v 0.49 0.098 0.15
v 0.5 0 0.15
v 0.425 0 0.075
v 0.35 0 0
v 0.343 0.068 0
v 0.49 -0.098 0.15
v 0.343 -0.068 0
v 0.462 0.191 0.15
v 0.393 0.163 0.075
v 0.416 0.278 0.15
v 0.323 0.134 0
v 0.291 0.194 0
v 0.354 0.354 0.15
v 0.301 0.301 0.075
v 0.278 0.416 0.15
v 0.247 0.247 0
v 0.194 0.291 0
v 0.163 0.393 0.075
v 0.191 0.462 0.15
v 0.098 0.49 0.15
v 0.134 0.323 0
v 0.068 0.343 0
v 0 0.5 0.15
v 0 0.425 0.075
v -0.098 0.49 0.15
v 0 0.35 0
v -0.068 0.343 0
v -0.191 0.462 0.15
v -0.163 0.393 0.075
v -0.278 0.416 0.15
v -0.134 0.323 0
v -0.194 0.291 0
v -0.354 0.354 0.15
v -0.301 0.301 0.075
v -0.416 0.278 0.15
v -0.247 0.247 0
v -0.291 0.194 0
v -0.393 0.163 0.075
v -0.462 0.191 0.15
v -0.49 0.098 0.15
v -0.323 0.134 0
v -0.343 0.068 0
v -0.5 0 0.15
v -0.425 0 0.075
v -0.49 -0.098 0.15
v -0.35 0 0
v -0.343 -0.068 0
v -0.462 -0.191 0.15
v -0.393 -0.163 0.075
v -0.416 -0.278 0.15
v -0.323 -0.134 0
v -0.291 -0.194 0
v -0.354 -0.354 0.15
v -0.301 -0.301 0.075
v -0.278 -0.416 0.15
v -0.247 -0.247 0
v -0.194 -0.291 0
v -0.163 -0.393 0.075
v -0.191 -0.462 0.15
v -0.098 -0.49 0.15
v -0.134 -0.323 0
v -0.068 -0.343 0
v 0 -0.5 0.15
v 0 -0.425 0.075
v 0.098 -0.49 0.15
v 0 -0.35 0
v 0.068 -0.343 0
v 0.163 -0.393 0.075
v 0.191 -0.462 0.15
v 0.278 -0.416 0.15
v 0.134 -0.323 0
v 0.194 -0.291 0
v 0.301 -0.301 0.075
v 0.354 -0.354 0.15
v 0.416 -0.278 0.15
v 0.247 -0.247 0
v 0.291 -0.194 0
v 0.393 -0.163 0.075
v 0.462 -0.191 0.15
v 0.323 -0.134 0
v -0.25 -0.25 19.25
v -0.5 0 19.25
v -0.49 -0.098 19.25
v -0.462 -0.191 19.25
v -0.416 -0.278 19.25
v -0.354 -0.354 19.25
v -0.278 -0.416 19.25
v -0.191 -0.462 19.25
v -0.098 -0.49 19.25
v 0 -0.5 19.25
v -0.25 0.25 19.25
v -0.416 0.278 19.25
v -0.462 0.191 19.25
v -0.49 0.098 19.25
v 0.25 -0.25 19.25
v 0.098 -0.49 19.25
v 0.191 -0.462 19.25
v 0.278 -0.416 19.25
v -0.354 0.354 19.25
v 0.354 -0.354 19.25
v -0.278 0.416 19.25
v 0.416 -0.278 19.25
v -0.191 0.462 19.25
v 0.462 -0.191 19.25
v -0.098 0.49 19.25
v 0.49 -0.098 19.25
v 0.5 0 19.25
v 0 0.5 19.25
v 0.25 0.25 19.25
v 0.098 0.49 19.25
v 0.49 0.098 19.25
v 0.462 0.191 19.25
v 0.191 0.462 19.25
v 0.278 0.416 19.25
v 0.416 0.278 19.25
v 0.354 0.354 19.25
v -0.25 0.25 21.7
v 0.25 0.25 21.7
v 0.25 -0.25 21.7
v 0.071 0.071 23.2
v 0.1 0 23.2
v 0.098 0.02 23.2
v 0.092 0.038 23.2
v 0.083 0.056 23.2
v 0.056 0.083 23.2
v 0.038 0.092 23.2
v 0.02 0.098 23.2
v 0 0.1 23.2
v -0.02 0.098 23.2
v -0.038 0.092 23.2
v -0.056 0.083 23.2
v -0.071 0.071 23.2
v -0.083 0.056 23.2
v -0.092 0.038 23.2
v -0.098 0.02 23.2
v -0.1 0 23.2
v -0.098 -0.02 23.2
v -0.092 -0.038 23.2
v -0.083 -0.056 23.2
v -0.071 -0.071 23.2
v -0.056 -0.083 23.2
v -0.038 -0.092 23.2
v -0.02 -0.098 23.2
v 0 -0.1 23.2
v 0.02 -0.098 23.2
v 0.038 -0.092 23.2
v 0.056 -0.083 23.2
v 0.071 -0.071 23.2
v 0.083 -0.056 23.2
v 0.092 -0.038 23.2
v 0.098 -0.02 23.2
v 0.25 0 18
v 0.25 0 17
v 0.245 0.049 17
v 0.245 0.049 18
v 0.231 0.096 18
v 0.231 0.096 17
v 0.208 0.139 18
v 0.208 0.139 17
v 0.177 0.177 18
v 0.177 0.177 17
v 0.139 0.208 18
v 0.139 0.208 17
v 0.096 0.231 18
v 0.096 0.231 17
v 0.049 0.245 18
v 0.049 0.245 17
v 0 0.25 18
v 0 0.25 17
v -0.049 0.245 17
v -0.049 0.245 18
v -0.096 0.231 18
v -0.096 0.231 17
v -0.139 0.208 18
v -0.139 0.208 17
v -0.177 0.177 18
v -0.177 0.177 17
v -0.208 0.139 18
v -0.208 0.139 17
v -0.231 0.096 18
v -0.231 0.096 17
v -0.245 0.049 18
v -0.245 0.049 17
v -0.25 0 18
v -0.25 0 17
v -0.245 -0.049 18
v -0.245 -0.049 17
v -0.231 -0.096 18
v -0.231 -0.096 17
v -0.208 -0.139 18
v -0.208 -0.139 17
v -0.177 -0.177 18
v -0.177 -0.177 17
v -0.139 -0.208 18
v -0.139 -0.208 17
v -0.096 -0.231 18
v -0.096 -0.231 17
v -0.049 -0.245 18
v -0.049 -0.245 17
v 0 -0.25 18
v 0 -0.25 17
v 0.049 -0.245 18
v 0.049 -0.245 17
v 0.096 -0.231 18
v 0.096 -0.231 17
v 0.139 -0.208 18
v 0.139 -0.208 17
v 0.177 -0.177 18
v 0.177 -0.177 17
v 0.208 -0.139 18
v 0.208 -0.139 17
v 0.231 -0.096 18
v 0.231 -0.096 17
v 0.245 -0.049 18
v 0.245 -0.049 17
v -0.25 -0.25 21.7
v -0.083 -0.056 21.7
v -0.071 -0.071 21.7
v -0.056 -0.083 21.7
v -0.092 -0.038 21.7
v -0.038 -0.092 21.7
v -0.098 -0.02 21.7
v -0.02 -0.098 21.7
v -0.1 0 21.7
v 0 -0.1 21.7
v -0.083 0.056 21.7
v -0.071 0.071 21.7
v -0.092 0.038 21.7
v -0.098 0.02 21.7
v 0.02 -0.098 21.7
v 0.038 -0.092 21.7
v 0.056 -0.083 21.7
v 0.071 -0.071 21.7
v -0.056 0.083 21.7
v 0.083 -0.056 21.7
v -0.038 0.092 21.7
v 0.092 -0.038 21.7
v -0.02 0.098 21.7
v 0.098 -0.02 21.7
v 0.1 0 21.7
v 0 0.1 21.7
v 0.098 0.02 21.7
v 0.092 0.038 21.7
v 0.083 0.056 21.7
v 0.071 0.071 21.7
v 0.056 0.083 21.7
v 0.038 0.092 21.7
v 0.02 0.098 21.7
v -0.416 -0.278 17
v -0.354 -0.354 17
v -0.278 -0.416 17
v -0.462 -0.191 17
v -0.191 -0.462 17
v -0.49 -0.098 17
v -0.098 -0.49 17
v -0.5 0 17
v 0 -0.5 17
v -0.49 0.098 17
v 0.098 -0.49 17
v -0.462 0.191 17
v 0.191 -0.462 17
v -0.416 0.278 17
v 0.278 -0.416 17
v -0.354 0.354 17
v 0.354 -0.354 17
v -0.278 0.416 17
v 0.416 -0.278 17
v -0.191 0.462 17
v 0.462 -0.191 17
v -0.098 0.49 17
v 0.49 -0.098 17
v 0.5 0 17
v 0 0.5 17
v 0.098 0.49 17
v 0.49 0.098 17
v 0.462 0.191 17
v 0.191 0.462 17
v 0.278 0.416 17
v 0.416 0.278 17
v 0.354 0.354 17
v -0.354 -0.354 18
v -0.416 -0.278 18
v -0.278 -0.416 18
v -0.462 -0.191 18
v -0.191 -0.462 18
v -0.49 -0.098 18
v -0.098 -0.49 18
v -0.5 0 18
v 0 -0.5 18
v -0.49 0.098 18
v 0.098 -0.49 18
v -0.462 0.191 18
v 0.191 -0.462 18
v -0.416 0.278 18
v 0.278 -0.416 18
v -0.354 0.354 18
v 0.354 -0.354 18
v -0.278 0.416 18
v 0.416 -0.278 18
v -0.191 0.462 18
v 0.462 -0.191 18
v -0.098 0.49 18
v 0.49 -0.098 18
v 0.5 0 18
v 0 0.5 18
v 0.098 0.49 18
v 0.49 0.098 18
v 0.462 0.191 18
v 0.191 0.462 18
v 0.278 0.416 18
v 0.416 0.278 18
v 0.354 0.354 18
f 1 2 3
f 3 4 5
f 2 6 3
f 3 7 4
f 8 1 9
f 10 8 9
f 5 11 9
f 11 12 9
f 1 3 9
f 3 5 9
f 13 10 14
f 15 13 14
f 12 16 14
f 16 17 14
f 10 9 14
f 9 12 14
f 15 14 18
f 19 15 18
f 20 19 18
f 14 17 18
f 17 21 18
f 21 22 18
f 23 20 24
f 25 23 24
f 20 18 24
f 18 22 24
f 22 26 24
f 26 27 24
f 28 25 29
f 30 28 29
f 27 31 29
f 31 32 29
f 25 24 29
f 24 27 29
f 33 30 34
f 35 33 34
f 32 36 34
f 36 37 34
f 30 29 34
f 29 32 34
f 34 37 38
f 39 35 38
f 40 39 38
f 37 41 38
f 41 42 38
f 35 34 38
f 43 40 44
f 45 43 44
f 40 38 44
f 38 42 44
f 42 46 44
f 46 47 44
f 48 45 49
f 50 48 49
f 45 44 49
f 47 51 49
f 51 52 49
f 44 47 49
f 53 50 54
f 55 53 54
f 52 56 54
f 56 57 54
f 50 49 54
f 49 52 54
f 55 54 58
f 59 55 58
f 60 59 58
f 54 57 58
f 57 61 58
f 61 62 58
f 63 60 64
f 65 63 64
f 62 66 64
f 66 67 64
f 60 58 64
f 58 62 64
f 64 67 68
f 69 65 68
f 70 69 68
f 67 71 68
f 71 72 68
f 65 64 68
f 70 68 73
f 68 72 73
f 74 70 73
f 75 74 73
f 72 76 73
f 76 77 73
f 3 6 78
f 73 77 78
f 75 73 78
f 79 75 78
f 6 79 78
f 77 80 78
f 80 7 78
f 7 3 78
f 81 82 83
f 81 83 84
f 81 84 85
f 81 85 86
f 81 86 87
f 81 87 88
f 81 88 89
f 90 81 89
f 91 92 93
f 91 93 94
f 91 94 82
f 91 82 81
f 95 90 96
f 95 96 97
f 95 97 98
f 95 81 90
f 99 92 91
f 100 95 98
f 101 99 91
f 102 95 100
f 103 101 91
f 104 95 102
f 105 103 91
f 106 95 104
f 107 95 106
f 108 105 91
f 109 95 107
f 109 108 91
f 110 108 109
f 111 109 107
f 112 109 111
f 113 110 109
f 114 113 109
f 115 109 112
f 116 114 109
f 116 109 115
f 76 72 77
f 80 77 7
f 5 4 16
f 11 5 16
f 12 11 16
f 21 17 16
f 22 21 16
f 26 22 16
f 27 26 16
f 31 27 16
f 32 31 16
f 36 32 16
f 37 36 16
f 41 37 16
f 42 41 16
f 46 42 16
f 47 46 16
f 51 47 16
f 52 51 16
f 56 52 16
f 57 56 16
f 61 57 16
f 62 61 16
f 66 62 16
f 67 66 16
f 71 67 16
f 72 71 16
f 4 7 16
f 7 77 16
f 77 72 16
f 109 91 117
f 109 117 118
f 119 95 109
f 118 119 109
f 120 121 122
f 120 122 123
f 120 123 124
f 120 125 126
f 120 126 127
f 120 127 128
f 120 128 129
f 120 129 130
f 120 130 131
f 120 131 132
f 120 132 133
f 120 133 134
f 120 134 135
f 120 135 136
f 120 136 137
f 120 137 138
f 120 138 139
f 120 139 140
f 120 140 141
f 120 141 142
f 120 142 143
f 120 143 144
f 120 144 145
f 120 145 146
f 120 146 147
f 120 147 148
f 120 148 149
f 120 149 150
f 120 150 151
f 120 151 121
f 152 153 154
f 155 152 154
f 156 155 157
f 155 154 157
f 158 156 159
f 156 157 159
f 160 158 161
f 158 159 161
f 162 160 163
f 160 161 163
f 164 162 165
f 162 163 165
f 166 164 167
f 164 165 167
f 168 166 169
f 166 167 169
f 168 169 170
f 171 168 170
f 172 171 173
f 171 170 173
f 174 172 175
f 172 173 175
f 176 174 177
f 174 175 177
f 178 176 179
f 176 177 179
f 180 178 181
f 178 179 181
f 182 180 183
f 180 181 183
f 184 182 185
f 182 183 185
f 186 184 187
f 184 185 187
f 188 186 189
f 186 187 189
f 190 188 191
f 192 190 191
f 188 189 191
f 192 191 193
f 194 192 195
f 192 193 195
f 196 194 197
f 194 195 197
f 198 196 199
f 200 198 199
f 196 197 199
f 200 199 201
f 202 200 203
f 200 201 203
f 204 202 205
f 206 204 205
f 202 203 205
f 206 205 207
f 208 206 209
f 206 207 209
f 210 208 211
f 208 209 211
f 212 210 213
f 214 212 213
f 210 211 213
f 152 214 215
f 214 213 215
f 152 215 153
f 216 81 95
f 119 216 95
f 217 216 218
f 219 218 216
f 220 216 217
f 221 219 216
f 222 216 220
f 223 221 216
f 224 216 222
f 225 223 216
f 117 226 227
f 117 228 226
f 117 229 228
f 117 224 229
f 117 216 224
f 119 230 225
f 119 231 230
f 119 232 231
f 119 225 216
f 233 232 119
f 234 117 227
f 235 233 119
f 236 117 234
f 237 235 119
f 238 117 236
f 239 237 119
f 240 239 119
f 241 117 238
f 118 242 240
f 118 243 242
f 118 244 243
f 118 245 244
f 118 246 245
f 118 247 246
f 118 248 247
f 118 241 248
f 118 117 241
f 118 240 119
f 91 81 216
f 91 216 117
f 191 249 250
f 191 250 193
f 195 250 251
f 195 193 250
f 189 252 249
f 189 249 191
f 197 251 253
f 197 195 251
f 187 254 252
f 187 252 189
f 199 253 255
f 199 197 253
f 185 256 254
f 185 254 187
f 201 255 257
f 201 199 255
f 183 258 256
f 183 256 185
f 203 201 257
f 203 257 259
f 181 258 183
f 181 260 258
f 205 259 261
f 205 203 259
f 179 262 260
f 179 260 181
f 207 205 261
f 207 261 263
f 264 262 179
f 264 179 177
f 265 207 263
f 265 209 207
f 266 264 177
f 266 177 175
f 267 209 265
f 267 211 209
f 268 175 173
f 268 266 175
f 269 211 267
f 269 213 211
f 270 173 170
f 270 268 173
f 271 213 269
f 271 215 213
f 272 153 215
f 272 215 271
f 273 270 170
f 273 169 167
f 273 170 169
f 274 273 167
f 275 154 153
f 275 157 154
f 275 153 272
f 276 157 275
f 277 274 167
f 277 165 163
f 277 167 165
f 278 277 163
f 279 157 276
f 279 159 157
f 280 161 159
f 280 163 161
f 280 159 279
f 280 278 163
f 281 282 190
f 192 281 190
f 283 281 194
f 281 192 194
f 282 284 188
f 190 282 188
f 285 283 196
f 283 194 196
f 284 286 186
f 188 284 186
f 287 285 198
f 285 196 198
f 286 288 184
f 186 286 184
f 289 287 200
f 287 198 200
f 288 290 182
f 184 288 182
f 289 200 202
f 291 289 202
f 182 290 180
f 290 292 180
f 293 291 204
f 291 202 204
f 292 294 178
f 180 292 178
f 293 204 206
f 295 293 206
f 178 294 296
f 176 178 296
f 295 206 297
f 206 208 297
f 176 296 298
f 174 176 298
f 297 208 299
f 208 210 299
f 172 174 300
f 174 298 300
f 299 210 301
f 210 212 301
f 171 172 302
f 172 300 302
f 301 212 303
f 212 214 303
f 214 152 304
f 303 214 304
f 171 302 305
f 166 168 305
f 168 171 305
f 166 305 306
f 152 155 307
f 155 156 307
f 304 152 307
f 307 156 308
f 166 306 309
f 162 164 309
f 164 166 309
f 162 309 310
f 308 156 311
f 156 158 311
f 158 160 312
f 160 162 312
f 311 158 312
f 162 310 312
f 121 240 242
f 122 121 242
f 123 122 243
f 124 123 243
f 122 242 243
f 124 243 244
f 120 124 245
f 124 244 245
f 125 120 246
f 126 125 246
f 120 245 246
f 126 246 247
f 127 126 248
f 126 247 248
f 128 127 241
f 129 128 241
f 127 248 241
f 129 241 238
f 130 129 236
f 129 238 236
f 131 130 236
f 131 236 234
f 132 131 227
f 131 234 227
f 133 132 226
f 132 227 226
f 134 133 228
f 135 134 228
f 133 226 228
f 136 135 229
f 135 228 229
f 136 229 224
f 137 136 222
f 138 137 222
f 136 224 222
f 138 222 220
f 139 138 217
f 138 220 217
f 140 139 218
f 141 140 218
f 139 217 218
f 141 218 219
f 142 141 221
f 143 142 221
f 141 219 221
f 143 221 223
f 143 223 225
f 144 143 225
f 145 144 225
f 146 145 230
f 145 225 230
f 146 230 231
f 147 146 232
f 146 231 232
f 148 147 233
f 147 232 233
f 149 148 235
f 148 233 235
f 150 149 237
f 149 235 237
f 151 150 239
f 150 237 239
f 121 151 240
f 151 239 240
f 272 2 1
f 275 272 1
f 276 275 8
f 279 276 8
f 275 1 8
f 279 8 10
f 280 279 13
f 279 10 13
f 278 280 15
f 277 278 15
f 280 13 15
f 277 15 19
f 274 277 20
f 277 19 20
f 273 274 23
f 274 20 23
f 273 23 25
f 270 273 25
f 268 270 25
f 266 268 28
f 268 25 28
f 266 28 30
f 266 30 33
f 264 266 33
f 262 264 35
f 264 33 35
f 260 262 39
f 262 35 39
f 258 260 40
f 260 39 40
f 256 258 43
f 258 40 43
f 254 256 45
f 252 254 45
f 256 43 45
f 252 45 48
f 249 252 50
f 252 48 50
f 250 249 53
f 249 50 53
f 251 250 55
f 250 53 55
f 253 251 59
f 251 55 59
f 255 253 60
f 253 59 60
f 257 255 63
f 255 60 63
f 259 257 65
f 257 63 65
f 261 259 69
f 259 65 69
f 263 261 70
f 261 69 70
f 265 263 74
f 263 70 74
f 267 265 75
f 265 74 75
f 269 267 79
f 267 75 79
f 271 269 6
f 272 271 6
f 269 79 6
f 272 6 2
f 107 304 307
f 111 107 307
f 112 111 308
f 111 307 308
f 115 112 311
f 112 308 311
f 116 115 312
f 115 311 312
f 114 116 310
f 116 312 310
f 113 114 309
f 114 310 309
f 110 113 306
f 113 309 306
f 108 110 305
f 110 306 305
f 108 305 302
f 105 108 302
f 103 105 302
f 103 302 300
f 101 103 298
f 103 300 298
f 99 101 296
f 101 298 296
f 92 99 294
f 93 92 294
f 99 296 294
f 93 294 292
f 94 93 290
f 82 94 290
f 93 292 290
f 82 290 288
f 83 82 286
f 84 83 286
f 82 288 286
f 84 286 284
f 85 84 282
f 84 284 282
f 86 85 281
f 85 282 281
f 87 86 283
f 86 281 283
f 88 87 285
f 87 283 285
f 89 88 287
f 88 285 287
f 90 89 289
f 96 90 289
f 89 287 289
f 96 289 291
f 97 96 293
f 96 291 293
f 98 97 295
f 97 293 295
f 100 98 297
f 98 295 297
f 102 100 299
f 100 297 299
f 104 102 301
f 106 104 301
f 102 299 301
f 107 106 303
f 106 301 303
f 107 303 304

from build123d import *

# Parameters (mm, degrees)
CROQUIS1_R              = 0.5
SALIENTE_EXTRUIR1_DEPTH = 17
CHAFL_N1_SIZE           = 0.15
CROQUIS6_R              = 0.25
SALIENTE_EXTRUIR2_DEPTH = 1
CROQUIS7_R              = 0.5
SALIENTE_EXTRUIR3_DEPTH = 1.25
CROQUIS8_W              = 0.5
CROQUIS8_H              = 0.5
SALIENTE_EXTRUIR4_DEPTH = 2.45
CROQUIS9_R              = 0.1
SALIENTE_EXTRUIR5_DEPTH = 1.5


with BuildPart() as part:
    # Croquis1 → Saliente-Extruir1 (new body)
    with BuildSketch(Plane.XY):
        Circle(CROQUIS1_R)
    extrude(amount=SALIENTE_EXTRUIR1_DEPTH)

    # Chaflán1
    chafl_n1_edges = [part.edges().sort_by_distance(p)[0] for p in [
        (-0.5, 0, 0),
    ]]
    chamfer(chafl_n1_edges, length=CHAFL_N1_SIZE)

    # Croquis6 → Saliente-Extruir2 (add)
    with BuildSketch(Plane.XY.offset(17)):
        Circle(CROQUIS6_R)
    extrude(amount=SALIENTE_EXTRUIR2_DEPTH)

    # Croquis7 → Saliente-Extruir3 (add)
    with BuildSketch(Plane.XY.offset(18)):
        Circle(CROQUIS7_R)
    extrude(amount=SALIENTE_EXTRUIR3_DEPTH)

    # Croquis8 → Saliente-Extruir4 (add)
    with BuildSketch(Plane.XY.offset(19.25)):
        Rectangle(CROQUIS8_W, CROQUIS8_H)
    extrude(amount=SALIENTE_EXTRUIR4_DEPTH)

    # Croquis9 → Saliente-Extruir5 (add)
    with BuildSketch(Plane.XY.offset(21.7)):
        Circle(CROQUIS9_R)
    extrude(amount=SALIENTE_EXTRUIR5_DEPTH)


solid = part.part
